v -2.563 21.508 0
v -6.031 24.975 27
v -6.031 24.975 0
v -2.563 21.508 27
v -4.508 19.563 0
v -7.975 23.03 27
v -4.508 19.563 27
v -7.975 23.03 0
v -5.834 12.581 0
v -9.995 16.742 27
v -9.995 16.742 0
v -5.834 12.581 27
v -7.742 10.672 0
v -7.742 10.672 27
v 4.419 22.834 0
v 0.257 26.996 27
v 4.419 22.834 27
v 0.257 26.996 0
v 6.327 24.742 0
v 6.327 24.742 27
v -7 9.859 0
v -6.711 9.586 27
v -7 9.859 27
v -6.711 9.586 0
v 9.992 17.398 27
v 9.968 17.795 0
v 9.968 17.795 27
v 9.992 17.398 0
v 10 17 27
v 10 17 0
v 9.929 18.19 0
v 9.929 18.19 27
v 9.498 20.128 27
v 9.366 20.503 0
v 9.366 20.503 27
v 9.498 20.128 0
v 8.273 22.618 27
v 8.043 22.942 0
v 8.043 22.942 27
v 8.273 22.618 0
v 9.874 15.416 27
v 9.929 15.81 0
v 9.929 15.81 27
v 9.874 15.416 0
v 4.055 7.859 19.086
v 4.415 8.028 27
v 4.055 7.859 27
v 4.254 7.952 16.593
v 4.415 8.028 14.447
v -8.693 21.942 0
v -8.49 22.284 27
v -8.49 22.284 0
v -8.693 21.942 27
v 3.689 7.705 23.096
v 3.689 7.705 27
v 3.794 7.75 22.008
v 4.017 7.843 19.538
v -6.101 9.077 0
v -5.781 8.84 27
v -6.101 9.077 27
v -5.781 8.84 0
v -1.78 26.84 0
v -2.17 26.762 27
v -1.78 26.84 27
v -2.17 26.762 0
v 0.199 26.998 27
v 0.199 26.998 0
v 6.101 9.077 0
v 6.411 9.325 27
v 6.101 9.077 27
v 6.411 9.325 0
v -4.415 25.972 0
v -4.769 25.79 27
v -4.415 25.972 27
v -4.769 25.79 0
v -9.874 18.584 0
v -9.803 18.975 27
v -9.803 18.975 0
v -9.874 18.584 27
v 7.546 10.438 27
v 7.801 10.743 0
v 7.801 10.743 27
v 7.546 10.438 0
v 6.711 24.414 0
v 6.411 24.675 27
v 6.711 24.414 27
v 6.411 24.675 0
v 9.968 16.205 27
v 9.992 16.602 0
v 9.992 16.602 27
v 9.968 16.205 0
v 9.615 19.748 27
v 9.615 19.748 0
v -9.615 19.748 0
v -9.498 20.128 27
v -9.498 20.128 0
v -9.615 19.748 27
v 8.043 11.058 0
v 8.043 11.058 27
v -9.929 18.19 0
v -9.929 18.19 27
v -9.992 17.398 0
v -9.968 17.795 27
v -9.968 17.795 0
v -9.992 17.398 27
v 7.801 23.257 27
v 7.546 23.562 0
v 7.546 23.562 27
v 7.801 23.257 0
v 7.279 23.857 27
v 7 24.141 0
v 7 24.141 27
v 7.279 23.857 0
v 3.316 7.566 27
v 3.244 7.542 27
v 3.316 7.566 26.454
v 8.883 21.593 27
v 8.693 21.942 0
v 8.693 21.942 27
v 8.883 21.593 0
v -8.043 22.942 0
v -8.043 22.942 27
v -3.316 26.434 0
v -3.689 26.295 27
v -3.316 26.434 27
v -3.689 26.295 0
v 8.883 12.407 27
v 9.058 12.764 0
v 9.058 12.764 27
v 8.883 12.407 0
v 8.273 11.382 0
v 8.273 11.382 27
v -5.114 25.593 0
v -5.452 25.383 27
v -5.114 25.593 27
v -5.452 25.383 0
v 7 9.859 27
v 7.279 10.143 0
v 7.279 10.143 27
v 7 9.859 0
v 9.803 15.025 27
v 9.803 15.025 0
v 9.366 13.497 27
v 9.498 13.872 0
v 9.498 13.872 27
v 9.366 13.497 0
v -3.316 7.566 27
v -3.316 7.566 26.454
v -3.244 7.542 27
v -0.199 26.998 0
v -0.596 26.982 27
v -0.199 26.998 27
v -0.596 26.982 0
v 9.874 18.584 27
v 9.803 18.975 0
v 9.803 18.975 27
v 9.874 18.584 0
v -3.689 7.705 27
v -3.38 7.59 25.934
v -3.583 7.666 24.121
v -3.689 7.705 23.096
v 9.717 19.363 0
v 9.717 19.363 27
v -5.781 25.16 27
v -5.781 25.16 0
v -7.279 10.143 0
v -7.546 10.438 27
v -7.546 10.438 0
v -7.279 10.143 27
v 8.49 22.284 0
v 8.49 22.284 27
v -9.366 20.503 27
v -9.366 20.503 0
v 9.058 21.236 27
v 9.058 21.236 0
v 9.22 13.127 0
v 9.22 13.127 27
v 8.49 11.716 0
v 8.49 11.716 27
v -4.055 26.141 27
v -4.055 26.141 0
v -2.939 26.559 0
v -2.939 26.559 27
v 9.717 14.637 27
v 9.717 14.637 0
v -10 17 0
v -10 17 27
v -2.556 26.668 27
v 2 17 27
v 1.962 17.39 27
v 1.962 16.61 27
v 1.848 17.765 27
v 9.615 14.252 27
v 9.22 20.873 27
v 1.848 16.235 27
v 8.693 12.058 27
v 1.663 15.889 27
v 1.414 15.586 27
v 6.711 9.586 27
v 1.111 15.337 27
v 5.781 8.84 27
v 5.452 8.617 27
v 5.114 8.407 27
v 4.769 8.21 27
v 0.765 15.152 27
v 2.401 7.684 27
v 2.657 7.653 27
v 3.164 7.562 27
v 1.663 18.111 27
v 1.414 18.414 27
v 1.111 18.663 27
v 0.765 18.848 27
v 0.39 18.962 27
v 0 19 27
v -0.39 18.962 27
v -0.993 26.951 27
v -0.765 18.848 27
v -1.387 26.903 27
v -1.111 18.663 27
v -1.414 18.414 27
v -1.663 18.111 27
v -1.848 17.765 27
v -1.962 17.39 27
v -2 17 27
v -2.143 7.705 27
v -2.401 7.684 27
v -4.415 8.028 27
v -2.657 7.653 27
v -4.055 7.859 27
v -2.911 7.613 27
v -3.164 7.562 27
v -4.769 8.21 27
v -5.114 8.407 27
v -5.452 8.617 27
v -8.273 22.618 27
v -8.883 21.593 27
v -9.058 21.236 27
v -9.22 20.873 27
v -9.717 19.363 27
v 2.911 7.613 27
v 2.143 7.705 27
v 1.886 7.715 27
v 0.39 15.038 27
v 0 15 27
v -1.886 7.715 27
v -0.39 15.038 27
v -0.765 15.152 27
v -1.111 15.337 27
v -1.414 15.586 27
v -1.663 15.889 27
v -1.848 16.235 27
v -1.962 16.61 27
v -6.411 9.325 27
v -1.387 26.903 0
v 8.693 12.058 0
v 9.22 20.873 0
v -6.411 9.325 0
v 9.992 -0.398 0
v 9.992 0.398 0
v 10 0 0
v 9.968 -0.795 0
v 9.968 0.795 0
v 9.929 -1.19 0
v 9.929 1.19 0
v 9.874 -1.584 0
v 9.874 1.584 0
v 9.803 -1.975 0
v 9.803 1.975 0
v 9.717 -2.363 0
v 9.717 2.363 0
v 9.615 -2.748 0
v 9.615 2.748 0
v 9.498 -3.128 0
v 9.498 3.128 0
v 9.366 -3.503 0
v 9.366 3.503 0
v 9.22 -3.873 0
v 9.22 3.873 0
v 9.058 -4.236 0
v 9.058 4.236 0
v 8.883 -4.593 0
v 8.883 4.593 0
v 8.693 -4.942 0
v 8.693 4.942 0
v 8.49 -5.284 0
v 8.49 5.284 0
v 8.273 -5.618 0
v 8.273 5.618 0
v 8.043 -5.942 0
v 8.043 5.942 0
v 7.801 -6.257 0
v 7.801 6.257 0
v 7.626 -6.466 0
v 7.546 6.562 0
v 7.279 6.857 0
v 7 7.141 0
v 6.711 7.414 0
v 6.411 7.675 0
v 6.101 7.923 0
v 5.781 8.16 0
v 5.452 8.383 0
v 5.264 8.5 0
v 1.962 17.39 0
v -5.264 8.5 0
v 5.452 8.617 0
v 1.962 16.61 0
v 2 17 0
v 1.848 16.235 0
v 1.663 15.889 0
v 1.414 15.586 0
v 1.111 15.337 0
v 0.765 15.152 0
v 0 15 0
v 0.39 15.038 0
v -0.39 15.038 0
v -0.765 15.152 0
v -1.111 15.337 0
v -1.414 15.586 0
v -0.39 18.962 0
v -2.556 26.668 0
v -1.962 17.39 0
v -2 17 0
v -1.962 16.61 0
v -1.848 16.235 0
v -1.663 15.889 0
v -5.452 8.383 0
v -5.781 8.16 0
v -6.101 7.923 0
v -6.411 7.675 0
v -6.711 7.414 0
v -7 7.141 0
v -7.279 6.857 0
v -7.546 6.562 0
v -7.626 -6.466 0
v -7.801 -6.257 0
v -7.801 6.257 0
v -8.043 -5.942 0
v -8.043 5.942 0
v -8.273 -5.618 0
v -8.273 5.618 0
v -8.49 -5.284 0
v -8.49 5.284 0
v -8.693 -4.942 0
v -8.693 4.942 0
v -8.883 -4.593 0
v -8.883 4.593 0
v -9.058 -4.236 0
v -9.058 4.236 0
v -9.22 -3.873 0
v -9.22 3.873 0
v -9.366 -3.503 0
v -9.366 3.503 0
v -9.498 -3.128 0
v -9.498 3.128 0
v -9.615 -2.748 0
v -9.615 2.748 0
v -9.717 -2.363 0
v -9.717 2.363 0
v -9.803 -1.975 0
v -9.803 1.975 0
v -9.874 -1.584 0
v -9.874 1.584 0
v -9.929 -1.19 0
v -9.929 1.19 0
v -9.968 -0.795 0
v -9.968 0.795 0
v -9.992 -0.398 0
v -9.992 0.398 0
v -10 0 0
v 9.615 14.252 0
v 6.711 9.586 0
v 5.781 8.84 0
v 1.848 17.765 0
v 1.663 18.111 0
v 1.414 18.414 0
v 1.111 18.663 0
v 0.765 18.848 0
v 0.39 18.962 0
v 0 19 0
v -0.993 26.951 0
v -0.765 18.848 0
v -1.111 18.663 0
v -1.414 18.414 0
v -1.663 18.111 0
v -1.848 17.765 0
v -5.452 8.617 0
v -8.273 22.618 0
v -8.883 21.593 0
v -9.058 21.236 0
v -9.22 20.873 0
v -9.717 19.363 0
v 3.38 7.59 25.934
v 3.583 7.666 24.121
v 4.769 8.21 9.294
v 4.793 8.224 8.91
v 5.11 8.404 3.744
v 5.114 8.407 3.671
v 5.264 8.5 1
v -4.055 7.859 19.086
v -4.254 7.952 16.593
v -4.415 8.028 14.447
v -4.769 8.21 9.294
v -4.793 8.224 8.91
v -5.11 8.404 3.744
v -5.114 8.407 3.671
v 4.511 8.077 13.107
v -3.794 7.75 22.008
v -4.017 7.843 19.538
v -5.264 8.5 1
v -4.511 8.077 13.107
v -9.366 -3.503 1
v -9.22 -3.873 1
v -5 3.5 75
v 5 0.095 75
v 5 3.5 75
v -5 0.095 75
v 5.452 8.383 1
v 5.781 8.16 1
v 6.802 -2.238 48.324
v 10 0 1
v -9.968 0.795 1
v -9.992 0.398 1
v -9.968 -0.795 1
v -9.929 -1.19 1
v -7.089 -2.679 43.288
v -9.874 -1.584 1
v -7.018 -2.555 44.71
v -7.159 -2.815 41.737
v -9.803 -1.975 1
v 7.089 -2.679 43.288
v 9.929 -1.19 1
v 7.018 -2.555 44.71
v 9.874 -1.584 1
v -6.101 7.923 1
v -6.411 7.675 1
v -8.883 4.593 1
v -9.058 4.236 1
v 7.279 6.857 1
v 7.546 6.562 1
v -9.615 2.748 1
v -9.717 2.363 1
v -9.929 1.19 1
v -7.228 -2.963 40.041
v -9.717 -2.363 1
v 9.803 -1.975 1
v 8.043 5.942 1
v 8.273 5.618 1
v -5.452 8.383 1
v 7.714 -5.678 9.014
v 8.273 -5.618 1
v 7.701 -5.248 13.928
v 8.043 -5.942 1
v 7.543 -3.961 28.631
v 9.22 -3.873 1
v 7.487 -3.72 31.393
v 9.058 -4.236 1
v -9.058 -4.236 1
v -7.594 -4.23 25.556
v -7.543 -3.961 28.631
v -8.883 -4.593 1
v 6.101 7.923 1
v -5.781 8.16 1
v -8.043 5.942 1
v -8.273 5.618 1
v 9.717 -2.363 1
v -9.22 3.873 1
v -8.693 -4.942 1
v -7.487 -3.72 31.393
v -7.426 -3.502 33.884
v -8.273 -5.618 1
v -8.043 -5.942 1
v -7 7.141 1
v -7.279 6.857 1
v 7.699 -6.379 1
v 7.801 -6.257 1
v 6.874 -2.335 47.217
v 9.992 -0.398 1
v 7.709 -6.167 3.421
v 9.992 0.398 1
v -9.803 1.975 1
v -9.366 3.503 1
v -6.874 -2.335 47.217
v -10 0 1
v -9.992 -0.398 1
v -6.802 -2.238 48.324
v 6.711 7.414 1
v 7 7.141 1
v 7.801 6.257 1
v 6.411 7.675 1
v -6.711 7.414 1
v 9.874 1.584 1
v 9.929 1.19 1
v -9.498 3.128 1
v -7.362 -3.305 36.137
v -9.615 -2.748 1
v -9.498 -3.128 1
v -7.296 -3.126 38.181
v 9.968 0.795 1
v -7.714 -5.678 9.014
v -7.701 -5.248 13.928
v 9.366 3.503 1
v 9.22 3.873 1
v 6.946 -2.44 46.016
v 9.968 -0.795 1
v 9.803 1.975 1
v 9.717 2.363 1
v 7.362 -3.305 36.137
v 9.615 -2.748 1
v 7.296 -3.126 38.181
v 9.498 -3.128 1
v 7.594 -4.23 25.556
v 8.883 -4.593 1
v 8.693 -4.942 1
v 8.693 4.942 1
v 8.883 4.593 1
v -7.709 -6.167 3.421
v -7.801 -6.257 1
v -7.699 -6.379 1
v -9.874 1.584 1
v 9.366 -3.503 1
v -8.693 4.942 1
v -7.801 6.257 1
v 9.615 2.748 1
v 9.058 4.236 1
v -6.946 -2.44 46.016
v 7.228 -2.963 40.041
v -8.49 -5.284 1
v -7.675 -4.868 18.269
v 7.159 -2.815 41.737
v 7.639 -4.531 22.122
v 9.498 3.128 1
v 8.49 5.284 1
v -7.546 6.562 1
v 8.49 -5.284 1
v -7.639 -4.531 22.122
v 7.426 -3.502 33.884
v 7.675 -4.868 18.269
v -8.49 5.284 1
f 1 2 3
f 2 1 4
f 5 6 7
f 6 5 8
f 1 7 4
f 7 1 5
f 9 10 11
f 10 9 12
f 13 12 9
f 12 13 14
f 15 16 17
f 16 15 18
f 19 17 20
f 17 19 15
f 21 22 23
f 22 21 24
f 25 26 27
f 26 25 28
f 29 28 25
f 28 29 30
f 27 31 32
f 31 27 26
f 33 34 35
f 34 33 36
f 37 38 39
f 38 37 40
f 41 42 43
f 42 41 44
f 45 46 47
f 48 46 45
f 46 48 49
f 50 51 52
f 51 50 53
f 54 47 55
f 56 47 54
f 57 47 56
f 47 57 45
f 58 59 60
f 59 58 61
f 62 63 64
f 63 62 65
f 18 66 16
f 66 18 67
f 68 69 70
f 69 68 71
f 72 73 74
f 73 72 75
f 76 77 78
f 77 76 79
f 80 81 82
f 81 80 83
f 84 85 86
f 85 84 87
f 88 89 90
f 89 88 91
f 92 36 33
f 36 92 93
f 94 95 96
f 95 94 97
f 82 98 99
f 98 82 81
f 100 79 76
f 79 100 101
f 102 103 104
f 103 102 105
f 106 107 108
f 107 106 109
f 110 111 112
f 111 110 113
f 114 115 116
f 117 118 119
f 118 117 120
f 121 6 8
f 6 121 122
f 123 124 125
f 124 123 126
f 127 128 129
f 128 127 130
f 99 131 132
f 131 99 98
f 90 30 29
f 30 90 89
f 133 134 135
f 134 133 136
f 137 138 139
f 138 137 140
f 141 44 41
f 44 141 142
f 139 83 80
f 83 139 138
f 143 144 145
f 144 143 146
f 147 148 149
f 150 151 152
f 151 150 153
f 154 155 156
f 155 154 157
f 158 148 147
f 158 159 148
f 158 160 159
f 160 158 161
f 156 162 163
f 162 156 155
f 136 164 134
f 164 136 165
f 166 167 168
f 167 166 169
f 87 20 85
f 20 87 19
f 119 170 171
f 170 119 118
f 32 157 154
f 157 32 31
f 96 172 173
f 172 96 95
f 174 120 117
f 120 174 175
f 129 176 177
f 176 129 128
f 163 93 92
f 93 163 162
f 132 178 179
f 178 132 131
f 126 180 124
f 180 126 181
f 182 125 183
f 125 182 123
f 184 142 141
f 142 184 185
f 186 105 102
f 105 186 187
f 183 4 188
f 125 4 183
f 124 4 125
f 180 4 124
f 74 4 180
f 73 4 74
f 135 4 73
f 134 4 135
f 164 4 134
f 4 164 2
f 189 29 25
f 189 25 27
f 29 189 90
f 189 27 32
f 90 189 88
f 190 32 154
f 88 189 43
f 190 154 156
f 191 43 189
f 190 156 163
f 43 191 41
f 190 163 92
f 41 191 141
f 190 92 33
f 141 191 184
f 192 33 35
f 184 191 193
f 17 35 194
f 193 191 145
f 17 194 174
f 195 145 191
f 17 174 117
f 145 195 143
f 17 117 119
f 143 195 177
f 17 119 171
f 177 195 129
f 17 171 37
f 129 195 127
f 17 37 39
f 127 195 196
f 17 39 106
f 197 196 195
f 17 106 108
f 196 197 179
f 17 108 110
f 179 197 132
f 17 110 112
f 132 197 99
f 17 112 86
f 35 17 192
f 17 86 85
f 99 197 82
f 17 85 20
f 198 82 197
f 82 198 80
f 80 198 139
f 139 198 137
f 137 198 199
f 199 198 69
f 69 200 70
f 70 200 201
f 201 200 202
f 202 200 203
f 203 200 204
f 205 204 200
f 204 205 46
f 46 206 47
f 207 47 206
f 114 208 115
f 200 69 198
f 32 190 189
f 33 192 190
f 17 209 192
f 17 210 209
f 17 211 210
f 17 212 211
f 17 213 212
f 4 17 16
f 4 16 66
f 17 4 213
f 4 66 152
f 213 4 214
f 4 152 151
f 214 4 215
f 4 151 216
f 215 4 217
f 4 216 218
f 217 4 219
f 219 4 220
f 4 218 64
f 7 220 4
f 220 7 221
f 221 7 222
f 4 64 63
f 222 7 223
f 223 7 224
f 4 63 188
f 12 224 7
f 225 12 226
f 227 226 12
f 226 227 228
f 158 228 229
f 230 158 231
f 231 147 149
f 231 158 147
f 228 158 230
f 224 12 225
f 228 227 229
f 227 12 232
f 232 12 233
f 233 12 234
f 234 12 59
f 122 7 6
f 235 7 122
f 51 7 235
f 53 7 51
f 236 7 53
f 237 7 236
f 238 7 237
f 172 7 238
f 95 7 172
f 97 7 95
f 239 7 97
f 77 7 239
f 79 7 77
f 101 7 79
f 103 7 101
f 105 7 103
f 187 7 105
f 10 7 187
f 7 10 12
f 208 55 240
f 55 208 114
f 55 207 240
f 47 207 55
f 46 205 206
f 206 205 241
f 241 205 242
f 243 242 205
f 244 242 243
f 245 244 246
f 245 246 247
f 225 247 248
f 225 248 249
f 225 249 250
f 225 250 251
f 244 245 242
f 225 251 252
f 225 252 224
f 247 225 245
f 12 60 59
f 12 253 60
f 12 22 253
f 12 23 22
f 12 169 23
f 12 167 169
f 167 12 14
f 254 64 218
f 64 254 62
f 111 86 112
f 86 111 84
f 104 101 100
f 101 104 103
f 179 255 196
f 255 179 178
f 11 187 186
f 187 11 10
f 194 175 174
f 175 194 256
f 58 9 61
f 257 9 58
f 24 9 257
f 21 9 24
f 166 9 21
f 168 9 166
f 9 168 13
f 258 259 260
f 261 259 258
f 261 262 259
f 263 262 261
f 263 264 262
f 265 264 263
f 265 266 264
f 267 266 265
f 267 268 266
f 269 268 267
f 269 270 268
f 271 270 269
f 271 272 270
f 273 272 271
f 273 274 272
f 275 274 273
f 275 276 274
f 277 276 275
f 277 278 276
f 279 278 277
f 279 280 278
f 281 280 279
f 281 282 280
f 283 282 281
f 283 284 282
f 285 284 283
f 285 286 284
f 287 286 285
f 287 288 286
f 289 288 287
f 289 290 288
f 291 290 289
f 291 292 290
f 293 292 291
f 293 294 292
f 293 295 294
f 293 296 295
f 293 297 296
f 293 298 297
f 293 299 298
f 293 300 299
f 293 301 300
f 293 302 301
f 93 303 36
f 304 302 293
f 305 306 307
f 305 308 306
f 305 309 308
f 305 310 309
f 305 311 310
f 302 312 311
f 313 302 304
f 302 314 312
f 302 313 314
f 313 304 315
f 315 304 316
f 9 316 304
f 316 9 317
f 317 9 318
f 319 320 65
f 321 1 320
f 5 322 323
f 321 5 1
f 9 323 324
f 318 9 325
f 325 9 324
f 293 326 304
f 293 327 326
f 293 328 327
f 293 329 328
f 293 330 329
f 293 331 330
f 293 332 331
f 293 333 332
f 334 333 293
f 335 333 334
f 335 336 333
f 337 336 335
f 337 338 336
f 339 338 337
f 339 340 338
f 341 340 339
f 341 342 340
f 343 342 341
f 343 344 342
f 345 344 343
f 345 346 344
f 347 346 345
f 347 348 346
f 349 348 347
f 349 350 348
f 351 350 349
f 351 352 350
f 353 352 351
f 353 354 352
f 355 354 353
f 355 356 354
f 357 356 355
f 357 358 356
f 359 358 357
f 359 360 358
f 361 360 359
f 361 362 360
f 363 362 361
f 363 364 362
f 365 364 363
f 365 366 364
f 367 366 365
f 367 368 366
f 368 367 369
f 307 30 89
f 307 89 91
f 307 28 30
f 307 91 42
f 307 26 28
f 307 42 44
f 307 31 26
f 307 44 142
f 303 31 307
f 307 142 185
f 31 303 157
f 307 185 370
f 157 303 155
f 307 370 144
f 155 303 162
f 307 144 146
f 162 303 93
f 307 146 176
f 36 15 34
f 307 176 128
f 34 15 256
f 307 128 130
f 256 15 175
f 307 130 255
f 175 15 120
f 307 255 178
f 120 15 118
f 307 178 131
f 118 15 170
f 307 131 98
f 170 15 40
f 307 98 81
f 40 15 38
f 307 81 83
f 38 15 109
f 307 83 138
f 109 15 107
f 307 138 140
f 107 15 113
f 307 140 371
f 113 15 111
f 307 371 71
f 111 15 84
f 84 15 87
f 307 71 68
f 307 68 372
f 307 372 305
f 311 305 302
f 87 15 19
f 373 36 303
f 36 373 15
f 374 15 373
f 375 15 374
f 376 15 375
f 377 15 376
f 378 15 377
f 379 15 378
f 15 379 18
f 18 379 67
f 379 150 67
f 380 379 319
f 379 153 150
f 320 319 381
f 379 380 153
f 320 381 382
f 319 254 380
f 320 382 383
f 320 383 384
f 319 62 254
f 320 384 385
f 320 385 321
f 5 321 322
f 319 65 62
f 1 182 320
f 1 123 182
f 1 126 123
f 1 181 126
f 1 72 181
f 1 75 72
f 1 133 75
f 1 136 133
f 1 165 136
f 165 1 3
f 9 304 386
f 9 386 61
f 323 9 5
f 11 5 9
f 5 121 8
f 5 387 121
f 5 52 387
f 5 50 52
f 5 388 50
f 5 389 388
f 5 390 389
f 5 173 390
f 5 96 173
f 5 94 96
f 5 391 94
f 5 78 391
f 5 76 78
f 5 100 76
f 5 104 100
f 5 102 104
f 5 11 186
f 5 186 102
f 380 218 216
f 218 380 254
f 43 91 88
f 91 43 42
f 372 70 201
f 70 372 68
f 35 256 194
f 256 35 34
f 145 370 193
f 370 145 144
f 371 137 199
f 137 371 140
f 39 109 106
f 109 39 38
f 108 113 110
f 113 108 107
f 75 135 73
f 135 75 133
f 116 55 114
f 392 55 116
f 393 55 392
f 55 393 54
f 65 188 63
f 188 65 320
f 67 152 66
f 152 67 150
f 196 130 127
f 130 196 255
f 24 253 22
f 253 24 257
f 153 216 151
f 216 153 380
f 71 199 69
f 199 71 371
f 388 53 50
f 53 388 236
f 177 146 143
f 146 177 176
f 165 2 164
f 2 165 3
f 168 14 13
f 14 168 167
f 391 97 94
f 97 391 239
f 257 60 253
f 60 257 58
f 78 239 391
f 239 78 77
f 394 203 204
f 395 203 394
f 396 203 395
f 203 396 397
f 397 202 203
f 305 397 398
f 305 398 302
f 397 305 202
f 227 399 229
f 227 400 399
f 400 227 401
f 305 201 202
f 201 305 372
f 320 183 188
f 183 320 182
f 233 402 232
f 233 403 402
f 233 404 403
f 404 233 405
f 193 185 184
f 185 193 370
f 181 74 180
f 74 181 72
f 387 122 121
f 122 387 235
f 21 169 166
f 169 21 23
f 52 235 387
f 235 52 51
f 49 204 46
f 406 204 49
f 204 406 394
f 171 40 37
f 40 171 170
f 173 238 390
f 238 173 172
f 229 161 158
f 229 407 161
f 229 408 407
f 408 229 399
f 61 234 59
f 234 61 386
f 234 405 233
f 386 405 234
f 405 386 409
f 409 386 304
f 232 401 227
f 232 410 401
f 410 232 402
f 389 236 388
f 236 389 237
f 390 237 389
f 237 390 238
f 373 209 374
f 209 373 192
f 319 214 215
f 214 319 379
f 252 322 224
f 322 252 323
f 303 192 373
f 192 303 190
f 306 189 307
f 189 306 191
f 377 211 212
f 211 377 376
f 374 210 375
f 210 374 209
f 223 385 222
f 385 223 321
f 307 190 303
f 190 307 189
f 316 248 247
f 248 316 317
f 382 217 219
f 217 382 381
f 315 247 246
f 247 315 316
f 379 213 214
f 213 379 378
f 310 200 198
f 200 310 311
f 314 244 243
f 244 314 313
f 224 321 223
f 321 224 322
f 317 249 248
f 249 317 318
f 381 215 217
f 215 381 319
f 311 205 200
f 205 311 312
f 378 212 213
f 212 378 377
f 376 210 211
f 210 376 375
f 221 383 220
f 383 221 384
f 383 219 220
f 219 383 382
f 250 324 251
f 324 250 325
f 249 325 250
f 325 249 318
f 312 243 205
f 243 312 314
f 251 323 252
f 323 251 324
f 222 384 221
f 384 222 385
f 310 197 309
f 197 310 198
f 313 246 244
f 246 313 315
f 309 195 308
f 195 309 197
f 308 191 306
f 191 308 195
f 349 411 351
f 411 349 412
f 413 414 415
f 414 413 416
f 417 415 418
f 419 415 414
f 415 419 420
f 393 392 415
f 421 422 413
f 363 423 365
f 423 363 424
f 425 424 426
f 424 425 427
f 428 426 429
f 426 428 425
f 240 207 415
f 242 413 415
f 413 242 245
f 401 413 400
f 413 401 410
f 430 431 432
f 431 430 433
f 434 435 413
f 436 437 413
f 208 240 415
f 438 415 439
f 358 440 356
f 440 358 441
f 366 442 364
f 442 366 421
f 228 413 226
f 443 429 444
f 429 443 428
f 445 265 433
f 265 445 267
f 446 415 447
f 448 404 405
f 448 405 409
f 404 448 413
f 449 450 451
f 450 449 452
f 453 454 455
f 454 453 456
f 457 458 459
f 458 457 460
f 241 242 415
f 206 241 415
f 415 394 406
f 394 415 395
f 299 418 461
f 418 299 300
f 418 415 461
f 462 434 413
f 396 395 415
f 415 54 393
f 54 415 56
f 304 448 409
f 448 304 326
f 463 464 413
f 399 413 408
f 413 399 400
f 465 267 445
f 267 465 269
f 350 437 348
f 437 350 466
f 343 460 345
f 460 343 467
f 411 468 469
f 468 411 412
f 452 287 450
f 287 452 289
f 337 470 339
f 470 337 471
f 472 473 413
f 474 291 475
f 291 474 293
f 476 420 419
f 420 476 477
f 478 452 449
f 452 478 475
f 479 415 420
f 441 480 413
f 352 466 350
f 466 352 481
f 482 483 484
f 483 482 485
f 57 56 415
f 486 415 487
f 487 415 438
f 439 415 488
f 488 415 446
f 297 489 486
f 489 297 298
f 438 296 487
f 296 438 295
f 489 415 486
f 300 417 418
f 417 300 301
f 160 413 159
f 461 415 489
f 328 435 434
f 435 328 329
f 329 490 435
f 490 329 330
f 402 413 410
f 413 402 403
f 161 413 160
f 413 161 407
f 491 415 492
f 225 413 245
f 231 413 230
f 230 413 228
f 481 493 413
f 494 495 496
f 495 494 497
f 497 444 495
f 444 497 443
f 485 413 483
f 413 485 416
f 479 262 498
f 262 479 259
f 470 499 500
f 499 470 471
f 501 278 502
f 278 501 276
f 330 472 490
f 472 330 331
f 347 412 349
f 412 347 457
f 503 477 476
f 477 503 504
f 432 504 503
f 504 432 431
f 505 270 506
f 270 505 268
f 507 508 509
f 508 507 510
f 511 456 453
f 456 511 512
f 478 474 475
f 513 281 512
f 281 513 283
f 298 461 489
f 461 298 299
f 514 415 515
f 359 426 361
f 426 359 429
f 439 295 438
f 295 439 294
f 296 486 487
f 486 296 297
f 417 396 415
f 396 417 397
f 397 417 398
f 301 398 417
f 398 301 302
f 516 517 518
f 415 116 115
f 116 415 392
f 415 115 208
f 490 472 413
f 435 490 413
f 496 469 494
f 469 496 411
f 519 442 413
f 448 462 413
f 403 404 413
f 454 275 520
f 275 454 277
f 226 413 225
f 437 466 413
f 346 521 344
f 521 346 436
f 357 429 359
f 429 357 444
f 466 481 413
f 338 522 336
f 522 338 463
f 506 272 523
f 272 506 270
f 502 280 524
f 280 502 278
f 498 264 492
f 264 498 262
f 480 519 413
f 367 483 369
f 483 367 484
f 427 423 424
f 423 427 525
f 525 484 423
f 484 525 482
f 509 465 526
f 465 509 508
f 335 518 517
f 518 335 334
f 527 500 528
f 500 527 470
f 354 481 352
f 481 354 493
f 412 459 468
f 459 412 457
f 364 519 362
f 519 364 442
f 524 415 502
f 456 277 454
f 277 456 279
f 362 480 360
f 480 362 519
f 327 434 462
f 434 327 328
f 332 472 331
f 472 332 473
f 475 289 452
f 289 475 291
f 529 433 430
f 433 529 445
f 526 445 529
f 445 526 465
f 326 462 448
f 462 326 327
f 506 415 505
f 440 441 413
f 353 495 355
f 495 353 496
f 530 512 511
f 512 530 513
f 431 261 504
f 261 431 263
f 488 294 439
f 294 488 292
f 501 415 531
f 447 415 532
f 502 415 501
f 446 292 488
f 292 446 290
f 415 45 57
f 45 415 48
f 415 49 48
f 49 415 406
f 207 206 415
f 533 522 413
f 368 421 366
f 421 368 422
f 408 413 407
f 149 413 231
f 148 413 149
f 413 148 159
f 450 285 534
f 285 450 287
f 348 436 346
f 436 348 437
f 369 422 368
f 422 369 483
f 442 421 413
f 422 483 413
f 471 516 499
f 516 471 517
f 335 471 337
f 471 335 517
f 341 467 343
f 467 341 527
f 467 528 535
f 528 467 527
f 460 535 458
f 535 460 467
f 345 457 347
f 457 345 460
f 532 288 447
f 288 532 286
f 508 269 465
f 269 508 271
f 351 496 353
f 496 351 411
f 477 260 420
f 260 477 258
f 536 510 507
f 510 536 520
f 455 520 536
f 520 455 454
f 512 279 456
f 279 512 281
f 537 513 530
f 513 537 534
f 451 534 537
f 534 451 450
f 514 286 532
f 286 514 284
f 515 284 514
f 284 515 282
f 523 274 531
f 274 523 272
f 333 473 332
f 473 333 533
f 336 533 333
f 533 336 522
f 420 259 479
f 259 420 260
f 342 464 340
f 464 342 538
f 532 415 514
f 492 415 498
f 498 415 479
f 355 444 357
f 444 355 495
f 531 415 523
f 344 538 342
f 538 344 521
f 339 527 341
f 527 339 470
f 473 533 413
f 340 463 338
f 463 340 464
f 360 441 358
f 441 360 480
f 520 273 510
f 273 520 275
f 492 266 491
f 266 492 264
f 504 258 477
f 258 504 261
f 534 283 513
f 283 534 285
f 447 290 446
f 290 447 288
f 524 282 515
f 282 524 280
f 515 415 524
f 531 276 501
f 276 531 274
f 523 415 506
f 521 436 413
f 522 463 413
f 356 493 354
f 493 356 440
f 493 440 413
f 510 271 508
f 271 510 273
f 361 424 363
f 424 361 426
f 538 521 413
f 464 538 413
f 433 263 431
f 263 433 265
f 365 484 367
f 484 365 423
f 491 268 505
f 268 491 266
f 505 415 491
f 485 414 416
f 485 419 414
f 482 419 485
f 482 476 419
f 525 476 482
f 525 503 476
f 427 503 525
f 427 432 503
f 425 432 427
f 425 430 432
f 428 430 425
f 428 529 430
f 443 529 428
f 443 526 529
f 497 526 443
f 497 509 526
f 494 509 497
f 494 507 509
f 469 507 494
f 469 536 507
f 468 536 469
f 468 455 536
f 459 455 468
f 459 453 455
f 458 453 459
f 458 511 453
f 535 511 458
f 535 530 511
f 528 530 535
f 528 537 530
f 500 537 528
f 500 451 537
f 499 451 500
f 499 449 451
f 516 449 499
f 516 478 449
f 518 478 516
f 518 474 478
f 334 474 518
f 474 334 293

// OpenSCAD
use <MCAD/boxes.scad>

$fa=1;
$fs=0.4;

module fin_cutout(c_offset=17, f_height=27){
    fin_length=2.75;
    fin_width=20;
    fin_height=2*f_height+1;
    fin_offset=10;
    fin_lateral_offset=4;
    fin_depth=c_offset+7;

    // center
    translate([0,fin_depth+fin_lateral_offset,0])
    cube([fin_length, fin_width, fin_height], center=true);
    // side negative
    translate([-fin_offset,fin_depth,0])
    cube([2*fin_length, fin_width, fin_height], center=true);
    // side positive
    translate([fin_offset,fin_depth,0])
    cube([2*fin_length, fin_width, fin_height], center=true);
}

module body(fan_radius, fan_height, screw_radius){
    difference(){
        cylinder(r=fan_radius, h=fan_height);
        cylinder(r=screw_radius, h=2*fan_height+1, center=true);
        rotate([0,0,45])
            fin_cutout(4, fan_height);
    }
}

module leg(leg_length=70){
    width = 10;
    height = 7;
    rotate([-90,0,0])
    translate([0,-leg_length-5,0])
    union(){     
        difference(){
            
            hull(){
                translate([0, width/2,0])
                    cube([width, width, height], center=true);
                    translate([0,leg_length + width/2, 0])
                        rotate([90,0,0])
                            cylinder(r=width, h=1);
            }
            translate([0,0,-25])
                rotate([-5,0,0])
                cube([200,200,50],center=true);
        }
    }
}

module fan_stand(leg_length=70, fan_radius=10, fan_height=27, screw_radius=2, cylinder_offset=17, test_print=false){

    difference(){
        union(){
            translate([0,cylinder_offset,0])
            body(fan_radius, fan_height, screw_radius);
            leg(leg_length);
        }
        if(test_print) { translate([0,0,55])
            cube([100,100,100], center=true);
        }
    }
}

leg_length=70;
fan_radius=10;
fan_height=27;
screw_radius=2;
cylinder_offset=17;
test_print=false;

fan_stand(leg_length, fan_radius, fan_height, screw_radius, cylinder_offset, test_print);
